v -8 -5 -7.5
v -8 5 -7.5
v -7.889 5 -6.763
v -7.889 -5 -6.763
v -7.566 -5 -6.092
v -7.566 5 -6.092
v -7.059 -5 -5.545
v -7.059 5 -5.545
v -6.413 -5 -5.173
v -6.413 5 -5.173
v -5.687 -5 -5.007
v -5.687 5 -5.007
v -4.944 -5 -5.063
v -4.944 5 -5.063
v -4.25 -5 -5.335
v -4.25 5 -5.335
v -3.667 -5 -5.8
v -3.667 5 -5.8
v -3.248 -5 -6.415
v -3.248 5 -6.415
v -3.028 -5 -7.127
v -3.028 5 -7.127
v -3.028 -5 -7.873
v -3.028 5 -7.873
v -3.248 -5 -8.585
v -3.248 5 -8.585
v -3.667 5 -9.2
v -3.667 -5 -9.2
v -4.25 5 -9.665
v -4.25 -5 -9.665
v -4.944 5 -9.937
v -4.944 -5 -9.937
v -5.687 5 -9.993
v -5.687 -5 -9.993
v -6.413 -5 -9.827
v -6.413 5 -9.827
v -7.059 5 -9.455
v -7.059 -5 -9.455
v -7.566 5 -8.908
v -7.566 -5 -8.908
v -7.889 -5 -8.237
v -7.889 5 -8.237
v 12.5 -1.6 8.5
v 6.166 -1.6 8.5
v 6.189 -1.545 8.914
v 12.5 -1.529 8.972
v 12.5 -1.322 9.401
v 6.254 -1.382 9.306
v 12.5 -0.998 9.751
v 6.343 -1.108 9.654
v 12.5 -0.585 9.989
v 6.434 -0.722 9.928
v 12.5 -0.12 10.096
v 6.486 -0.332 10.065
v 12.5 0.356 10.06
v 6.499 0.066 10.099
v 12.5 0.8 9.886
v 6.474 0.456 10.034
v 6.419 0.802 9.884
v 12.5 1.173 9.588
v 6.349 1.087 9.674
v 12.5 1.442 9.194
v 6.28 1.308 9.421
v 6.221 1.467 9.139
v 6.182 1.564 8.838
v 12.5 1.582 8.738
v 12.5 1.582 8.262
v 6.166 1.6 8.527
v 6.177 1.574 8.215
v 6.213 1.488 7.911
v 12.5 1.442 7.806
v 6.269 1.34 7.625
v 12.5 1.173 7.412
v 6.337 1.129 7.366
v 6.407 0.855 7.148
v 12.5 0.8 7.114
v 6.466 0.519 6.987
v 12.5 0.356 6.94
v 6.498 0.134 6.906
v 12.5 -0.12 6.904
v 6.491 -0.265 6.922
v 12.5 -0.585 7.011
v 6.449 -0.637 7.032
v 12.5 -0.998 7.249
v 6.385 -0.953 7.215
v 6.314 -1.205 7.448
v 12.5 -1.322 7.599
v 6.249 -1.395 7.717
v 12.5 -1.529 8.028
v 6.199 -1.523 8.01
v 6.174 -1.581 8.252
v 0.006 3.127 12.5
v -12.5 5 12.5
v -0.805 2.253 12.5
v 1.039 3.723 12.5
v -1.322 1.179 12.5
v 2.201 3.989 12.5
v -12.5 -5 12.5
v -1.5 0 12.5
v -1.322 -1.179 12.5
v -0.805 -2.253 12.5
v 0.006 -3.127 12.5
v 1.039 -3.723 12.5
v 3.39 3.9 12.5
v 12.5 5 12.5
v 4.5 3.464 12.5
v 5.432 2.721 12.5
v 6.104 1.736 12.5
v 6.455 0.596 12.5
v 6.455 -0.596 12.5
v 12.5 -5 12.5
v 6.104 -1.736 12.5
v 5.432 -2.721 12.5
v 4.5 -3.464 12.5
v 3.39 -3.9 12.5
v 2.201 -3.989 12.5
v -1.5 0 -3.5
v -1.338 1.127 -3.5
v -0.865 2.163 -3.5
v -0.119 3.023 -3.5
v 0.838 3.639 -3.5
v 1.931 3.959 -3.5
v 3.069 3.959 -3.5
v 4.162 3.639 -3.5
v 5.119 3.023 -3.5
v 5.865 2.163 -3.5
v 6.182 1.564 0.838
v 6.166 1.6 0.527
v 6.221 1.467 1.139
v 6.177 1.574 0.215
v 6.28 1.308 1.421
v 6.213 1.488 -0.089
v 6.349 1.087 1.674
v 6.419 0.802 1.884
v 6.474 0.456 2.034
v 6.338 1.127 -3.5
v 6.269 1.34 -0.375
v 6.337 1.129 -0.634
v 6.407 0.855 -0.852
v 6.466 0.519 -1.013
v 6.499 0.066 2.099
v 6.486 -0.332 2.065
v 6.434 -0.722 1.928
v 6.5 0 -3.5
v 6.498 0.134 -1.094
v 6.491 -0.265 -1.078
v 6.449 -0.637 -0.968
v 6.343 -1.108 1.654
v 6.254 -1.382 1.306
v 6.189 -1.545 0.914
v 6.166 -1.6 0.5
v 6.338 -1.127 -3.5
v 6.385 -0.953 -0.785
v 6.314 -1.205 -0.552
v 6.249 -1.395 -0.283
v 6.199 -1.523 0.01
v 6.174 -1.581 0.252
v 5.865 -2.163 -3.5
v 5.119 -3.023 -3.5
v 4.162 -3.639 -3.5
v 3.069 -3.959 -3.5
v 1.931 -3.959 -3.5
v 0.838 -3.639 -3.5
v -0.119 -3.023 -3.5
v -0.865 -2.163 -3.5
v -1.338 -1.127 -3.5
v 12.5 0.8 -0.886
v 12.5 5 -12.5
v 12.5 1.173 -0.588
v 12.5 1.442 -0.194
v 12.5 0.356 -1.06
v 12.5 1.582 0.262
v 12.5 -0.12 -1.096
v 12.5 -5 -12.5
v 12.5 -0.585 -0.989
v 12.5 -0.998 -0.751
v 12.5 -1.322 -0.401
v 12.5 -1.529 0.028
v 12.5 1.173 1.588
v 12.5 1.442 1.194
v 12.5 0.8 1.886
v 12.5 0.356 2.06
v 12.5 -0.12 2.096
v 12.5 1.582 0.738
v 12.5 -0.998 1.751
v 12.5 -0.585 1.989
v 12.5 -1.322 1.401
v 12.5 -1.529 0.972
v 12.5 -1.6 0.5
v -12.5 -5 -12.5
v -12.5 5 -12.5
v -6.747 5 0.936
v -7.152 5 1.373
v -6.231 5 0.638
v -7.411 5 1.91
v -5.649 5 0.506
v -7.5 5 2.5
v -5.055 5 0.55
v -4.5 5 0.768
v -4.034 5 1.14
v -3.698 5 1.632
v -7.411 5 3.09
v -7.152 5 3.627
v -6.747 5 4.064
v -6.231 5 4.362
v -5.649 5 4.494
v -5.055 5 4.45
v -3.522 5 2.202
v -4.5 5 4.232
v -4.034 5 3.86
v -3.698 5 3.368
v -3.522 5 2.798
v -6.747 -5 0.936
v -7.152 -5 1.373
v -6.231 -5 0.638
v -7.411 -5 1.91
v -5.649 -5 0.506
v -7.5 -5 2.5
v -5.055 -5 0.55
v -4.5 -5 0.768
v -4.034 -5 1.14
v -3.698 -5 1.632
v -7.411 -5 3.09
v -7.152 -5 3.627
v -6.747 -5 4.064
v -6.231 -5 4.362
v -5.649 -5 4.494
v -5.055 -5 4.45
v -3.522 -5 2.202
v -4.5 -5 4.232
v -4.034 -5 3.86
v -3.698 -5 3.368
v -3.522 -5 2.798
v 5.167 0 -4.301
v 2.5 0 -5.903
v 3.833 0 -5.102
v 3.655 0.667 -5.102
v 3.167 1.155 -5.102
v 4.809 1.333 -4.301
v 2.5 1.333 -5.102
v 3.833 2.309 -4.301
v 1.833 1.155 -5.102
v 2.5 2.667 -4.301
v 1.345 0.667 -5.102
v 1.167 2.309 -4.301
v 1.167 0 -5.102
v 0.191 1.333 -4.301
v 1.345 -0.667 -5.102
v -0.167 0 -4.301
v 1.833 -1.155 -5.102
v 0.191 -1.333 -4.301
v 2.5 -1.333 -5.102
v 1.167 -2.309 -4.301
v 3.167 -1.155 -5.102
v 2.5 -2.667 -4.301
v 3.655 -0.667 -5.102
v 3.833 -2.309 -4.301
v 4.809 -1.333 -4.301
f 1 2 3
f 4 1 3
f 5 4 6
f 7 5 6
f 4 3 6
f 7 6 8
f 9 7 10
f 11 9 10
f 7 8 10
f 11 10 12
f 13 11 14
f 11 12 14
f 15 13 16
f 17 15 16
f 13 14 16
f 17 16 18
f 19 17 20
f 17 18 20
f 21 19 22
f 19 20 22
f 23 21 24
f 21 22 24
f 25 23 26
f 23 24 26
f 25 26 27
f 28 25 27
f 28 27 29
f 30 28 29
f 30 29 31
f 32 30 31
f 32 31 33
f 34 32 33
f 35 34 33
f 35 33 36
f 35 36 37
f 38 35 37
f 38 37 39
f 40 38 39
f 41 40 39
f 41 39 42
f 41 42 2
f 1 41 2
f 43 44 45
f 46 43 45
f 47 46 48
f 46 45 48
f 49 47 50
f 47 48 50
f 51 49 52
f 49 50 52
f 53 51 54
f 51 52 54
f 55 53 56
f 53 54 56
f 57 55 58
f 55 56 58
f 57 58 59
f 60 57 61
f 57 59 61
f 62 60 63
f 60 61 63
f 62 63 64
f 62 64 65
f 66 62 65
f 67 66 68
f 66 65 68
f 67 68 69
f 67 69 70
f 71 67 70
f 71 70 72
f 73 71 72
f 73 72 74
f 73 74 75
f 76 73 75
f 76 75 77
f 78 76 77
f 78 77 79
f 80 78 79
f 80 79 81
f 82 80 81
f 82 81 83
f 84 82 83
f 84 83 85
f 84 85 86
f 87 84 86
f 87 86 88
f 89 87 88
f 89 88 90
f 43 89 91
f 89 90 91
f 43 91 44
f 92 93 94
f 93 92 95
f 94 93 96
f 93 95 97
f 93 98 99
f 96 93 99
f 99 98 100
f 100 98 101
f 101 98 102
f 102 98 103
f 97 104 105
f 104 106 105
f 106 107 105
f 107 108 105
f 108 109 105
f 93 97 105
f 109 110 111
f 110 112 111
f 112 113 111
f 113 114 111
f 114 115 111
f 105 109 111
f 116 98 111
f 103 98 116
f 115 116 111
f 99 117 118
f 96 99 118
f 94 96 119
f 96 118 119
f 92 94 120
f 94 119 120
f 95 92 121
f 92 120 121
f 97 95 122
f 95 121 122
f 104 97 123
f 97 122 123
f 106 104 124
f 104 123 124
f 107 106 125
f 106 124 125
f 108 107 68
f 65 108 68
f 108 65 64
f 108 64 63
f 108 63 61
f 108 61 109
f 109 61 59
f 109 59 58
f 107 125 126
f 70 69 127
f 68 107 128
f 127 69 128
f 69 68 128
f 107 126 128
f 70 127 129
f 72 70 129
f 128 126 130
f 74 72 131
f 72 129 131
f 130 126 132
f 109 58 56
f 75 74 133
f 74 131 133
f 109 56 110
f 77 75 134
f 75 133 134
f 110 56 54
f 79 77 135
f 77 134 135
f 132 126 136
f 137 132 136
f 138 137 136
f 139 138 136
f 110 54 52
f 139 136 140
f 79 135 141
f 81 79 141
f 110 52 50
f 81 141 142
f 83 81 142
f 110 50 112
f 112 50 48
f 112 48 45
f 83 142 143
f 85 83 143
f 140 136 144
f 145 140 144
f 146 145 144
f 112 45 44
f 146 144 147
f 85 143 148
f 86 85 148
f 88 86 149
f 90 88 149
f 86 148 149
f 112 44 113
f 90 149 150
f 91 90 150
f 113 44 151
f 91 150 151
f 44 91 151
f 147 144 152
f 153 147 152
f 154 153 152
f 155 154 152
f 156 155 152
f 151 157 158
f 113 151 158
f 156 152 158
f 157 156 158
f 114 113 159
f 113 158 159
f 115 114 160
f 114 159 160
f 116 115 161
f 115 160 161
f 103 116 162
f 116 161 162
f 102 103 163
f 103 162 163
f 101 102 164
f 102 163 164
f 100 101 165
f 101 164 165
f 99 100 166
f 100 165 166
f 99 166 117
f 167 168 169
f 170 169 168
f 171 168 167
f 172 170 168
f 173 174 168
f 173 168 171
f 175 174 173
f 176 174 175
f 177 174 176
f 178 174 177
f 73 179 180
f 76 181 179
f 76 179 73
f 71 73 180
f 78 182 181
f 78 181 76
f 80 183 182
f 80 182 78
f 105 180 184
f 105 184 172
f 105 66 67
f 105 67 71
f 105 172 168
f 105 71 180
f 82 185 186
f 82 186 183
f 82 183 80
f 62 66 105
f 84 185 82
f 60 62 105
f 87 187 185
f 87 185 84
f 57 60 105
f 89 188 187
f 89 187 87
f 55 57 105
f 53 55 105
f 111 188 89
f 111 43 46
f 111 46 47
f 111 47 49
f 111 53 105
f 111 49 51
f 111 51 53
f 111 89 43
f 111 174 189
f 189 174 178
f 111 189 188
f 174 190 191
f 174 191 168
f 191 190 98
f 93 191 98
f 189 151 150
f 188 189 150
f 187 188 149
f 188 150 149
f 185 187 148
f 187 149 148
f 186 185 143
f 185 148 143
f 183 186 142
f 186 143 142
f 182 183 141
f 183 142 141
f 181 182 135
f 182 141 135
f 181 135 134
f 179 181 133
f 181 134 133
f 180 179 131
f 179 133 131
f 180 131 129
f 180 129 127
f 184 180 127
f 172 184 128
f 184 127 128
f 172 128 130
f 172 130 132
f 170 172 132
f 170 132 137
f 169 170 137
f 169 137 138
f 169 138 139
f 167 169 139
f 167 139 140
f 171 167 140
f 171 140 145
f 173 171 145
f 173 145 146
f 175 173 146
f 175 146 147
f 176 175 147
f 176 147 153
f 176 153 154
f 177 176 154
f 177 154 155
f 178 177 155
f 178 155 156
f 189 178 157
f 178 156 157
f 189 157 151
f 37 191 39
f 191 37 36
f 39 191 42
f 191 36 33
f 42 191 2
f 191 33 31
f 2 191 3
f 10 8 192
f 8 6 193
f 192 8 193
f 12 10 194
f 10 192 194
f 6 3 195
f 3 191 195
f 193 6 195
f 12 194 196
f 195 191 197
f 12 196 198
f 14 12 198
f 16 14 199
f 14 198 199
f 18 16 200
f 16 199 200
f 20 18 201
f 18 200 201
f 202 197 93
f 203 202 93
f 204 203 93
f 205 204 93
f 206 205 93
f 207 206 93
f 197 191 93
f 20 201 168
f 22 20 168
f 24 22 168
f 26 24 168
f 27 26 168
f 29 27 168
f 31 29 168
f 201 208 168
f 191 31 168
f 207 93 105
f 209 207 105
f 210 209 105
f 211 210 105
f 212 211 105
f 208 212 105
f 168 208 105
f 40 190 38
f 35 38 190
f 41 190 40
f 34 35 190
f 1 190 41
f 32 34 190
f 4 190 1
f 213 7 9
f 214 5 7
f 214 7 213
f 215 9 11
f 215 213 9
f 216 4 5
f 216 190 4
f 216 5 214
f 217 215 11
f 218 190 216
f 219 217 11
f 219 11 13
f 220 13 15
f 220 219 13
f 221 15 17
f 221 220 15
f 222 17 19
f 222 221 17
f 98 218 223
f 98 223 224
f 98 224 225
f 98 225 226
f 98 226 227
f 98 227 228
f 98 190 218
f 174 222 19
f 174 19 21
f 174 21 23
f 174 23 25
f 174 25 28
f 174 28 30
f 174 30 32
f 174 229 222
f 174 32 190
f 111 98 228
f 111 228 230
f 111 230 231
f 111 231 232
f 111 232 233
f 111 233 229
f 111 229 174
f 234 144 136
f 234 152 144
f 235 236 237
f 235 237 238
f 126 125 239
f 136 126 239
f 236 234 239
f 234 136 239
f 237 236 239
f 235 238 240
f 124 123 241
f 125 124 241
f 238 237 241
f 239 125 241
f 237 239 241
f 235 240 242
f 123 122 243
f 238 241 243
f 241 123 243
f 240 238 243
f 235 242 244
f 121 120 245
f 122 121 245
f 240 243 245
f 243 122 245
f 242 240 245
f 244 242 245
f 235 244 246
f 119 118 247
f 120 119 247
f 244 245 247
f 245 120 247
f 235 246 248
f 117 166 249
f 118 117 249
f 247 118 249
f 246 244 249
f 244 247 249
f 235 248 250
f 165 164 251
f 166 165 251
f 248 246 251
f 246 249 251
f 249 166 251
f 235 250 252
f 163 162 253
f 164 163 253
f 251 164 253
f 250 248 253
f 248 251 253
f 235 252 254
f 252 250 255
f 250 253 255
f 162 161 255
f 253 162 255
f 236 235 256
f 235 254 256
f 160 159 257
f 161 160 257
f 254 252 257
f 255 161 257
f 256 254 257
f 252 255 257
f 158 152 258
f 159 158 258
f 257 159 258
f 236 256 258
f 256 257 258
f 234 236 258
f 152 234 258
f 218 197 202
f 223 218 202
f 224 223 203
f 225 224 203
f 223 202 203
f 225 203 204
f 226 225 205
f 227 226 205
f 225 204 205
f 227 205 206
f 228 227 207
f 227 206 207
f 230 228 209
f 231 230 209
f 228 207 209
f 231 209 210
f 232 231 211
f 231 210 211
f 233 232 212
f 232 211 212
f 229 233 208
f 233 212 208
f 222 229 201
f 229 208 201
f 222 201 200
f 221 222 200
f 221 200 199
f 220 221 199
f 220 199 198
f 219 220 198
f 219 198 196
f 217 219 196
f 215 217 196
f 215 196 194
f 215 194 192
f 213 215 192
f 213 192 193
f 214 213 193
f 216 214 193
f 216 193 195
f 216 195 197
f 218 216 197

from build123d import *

# Parameters (mm, degrees)
F0_W     = 25
F0_H     = 25
F1_DEPTH = 5
F3_D     = 4
F4_D     = 5
F6_D     = 8
F6_DEPTH = 16
F6_TIP   = 2.4034424761
F8_D     = 3.2
F8_DEPTH = 10
F8_TIP   = 0.9613769904


with BuildPart() as f1:
    # F0 (on Front) → F1 (new body, symmetric)
    with BuildSketch(Plane.XZ):
        Rectangle(F0_W, F0_H)
    extrude(amount=F1_DEPTH, both=True)

    # F3 (through all)
    with Locations(Plane.XZ.offset(5)):
        with Locations((-5.5, 2.5)):
            Hole(F3_D / 2)

    # F4 (through all)
    with Locations(Plane.XZ.offset(5)):
        with Locations((-5.5, -7.5)):
            Hole(F4_D / 2)

    # F6
    with Locations(Plane.XY.offset(12.5)):
        with Locations((2.5, 0)):
            Hole(F6_D / 2, depth=F6_DEPTH)
            with Locations((0, 0, -(F6_DEPTH + F6_TIP / 2))):  # 118° drill point
                Cone(0, F6_D / 2, F6_TIP, mode=Mode.SUBTRACT)

    # F8
    with Locations(Plane.YZ.offset(12.5)):
        with Locations((0, 8.5), (0, 0.5)):
            Hole(F8_D / 2, depth=F8_DEPTH)
            with Locations((0, 0, -(F8_DEPTH + F8_TIP / 2))):  # 118° drill point
                Cone(0, F8_D / 2, F8_TIP, mode=Mode.SUBTRACT)


solid = f1.part
